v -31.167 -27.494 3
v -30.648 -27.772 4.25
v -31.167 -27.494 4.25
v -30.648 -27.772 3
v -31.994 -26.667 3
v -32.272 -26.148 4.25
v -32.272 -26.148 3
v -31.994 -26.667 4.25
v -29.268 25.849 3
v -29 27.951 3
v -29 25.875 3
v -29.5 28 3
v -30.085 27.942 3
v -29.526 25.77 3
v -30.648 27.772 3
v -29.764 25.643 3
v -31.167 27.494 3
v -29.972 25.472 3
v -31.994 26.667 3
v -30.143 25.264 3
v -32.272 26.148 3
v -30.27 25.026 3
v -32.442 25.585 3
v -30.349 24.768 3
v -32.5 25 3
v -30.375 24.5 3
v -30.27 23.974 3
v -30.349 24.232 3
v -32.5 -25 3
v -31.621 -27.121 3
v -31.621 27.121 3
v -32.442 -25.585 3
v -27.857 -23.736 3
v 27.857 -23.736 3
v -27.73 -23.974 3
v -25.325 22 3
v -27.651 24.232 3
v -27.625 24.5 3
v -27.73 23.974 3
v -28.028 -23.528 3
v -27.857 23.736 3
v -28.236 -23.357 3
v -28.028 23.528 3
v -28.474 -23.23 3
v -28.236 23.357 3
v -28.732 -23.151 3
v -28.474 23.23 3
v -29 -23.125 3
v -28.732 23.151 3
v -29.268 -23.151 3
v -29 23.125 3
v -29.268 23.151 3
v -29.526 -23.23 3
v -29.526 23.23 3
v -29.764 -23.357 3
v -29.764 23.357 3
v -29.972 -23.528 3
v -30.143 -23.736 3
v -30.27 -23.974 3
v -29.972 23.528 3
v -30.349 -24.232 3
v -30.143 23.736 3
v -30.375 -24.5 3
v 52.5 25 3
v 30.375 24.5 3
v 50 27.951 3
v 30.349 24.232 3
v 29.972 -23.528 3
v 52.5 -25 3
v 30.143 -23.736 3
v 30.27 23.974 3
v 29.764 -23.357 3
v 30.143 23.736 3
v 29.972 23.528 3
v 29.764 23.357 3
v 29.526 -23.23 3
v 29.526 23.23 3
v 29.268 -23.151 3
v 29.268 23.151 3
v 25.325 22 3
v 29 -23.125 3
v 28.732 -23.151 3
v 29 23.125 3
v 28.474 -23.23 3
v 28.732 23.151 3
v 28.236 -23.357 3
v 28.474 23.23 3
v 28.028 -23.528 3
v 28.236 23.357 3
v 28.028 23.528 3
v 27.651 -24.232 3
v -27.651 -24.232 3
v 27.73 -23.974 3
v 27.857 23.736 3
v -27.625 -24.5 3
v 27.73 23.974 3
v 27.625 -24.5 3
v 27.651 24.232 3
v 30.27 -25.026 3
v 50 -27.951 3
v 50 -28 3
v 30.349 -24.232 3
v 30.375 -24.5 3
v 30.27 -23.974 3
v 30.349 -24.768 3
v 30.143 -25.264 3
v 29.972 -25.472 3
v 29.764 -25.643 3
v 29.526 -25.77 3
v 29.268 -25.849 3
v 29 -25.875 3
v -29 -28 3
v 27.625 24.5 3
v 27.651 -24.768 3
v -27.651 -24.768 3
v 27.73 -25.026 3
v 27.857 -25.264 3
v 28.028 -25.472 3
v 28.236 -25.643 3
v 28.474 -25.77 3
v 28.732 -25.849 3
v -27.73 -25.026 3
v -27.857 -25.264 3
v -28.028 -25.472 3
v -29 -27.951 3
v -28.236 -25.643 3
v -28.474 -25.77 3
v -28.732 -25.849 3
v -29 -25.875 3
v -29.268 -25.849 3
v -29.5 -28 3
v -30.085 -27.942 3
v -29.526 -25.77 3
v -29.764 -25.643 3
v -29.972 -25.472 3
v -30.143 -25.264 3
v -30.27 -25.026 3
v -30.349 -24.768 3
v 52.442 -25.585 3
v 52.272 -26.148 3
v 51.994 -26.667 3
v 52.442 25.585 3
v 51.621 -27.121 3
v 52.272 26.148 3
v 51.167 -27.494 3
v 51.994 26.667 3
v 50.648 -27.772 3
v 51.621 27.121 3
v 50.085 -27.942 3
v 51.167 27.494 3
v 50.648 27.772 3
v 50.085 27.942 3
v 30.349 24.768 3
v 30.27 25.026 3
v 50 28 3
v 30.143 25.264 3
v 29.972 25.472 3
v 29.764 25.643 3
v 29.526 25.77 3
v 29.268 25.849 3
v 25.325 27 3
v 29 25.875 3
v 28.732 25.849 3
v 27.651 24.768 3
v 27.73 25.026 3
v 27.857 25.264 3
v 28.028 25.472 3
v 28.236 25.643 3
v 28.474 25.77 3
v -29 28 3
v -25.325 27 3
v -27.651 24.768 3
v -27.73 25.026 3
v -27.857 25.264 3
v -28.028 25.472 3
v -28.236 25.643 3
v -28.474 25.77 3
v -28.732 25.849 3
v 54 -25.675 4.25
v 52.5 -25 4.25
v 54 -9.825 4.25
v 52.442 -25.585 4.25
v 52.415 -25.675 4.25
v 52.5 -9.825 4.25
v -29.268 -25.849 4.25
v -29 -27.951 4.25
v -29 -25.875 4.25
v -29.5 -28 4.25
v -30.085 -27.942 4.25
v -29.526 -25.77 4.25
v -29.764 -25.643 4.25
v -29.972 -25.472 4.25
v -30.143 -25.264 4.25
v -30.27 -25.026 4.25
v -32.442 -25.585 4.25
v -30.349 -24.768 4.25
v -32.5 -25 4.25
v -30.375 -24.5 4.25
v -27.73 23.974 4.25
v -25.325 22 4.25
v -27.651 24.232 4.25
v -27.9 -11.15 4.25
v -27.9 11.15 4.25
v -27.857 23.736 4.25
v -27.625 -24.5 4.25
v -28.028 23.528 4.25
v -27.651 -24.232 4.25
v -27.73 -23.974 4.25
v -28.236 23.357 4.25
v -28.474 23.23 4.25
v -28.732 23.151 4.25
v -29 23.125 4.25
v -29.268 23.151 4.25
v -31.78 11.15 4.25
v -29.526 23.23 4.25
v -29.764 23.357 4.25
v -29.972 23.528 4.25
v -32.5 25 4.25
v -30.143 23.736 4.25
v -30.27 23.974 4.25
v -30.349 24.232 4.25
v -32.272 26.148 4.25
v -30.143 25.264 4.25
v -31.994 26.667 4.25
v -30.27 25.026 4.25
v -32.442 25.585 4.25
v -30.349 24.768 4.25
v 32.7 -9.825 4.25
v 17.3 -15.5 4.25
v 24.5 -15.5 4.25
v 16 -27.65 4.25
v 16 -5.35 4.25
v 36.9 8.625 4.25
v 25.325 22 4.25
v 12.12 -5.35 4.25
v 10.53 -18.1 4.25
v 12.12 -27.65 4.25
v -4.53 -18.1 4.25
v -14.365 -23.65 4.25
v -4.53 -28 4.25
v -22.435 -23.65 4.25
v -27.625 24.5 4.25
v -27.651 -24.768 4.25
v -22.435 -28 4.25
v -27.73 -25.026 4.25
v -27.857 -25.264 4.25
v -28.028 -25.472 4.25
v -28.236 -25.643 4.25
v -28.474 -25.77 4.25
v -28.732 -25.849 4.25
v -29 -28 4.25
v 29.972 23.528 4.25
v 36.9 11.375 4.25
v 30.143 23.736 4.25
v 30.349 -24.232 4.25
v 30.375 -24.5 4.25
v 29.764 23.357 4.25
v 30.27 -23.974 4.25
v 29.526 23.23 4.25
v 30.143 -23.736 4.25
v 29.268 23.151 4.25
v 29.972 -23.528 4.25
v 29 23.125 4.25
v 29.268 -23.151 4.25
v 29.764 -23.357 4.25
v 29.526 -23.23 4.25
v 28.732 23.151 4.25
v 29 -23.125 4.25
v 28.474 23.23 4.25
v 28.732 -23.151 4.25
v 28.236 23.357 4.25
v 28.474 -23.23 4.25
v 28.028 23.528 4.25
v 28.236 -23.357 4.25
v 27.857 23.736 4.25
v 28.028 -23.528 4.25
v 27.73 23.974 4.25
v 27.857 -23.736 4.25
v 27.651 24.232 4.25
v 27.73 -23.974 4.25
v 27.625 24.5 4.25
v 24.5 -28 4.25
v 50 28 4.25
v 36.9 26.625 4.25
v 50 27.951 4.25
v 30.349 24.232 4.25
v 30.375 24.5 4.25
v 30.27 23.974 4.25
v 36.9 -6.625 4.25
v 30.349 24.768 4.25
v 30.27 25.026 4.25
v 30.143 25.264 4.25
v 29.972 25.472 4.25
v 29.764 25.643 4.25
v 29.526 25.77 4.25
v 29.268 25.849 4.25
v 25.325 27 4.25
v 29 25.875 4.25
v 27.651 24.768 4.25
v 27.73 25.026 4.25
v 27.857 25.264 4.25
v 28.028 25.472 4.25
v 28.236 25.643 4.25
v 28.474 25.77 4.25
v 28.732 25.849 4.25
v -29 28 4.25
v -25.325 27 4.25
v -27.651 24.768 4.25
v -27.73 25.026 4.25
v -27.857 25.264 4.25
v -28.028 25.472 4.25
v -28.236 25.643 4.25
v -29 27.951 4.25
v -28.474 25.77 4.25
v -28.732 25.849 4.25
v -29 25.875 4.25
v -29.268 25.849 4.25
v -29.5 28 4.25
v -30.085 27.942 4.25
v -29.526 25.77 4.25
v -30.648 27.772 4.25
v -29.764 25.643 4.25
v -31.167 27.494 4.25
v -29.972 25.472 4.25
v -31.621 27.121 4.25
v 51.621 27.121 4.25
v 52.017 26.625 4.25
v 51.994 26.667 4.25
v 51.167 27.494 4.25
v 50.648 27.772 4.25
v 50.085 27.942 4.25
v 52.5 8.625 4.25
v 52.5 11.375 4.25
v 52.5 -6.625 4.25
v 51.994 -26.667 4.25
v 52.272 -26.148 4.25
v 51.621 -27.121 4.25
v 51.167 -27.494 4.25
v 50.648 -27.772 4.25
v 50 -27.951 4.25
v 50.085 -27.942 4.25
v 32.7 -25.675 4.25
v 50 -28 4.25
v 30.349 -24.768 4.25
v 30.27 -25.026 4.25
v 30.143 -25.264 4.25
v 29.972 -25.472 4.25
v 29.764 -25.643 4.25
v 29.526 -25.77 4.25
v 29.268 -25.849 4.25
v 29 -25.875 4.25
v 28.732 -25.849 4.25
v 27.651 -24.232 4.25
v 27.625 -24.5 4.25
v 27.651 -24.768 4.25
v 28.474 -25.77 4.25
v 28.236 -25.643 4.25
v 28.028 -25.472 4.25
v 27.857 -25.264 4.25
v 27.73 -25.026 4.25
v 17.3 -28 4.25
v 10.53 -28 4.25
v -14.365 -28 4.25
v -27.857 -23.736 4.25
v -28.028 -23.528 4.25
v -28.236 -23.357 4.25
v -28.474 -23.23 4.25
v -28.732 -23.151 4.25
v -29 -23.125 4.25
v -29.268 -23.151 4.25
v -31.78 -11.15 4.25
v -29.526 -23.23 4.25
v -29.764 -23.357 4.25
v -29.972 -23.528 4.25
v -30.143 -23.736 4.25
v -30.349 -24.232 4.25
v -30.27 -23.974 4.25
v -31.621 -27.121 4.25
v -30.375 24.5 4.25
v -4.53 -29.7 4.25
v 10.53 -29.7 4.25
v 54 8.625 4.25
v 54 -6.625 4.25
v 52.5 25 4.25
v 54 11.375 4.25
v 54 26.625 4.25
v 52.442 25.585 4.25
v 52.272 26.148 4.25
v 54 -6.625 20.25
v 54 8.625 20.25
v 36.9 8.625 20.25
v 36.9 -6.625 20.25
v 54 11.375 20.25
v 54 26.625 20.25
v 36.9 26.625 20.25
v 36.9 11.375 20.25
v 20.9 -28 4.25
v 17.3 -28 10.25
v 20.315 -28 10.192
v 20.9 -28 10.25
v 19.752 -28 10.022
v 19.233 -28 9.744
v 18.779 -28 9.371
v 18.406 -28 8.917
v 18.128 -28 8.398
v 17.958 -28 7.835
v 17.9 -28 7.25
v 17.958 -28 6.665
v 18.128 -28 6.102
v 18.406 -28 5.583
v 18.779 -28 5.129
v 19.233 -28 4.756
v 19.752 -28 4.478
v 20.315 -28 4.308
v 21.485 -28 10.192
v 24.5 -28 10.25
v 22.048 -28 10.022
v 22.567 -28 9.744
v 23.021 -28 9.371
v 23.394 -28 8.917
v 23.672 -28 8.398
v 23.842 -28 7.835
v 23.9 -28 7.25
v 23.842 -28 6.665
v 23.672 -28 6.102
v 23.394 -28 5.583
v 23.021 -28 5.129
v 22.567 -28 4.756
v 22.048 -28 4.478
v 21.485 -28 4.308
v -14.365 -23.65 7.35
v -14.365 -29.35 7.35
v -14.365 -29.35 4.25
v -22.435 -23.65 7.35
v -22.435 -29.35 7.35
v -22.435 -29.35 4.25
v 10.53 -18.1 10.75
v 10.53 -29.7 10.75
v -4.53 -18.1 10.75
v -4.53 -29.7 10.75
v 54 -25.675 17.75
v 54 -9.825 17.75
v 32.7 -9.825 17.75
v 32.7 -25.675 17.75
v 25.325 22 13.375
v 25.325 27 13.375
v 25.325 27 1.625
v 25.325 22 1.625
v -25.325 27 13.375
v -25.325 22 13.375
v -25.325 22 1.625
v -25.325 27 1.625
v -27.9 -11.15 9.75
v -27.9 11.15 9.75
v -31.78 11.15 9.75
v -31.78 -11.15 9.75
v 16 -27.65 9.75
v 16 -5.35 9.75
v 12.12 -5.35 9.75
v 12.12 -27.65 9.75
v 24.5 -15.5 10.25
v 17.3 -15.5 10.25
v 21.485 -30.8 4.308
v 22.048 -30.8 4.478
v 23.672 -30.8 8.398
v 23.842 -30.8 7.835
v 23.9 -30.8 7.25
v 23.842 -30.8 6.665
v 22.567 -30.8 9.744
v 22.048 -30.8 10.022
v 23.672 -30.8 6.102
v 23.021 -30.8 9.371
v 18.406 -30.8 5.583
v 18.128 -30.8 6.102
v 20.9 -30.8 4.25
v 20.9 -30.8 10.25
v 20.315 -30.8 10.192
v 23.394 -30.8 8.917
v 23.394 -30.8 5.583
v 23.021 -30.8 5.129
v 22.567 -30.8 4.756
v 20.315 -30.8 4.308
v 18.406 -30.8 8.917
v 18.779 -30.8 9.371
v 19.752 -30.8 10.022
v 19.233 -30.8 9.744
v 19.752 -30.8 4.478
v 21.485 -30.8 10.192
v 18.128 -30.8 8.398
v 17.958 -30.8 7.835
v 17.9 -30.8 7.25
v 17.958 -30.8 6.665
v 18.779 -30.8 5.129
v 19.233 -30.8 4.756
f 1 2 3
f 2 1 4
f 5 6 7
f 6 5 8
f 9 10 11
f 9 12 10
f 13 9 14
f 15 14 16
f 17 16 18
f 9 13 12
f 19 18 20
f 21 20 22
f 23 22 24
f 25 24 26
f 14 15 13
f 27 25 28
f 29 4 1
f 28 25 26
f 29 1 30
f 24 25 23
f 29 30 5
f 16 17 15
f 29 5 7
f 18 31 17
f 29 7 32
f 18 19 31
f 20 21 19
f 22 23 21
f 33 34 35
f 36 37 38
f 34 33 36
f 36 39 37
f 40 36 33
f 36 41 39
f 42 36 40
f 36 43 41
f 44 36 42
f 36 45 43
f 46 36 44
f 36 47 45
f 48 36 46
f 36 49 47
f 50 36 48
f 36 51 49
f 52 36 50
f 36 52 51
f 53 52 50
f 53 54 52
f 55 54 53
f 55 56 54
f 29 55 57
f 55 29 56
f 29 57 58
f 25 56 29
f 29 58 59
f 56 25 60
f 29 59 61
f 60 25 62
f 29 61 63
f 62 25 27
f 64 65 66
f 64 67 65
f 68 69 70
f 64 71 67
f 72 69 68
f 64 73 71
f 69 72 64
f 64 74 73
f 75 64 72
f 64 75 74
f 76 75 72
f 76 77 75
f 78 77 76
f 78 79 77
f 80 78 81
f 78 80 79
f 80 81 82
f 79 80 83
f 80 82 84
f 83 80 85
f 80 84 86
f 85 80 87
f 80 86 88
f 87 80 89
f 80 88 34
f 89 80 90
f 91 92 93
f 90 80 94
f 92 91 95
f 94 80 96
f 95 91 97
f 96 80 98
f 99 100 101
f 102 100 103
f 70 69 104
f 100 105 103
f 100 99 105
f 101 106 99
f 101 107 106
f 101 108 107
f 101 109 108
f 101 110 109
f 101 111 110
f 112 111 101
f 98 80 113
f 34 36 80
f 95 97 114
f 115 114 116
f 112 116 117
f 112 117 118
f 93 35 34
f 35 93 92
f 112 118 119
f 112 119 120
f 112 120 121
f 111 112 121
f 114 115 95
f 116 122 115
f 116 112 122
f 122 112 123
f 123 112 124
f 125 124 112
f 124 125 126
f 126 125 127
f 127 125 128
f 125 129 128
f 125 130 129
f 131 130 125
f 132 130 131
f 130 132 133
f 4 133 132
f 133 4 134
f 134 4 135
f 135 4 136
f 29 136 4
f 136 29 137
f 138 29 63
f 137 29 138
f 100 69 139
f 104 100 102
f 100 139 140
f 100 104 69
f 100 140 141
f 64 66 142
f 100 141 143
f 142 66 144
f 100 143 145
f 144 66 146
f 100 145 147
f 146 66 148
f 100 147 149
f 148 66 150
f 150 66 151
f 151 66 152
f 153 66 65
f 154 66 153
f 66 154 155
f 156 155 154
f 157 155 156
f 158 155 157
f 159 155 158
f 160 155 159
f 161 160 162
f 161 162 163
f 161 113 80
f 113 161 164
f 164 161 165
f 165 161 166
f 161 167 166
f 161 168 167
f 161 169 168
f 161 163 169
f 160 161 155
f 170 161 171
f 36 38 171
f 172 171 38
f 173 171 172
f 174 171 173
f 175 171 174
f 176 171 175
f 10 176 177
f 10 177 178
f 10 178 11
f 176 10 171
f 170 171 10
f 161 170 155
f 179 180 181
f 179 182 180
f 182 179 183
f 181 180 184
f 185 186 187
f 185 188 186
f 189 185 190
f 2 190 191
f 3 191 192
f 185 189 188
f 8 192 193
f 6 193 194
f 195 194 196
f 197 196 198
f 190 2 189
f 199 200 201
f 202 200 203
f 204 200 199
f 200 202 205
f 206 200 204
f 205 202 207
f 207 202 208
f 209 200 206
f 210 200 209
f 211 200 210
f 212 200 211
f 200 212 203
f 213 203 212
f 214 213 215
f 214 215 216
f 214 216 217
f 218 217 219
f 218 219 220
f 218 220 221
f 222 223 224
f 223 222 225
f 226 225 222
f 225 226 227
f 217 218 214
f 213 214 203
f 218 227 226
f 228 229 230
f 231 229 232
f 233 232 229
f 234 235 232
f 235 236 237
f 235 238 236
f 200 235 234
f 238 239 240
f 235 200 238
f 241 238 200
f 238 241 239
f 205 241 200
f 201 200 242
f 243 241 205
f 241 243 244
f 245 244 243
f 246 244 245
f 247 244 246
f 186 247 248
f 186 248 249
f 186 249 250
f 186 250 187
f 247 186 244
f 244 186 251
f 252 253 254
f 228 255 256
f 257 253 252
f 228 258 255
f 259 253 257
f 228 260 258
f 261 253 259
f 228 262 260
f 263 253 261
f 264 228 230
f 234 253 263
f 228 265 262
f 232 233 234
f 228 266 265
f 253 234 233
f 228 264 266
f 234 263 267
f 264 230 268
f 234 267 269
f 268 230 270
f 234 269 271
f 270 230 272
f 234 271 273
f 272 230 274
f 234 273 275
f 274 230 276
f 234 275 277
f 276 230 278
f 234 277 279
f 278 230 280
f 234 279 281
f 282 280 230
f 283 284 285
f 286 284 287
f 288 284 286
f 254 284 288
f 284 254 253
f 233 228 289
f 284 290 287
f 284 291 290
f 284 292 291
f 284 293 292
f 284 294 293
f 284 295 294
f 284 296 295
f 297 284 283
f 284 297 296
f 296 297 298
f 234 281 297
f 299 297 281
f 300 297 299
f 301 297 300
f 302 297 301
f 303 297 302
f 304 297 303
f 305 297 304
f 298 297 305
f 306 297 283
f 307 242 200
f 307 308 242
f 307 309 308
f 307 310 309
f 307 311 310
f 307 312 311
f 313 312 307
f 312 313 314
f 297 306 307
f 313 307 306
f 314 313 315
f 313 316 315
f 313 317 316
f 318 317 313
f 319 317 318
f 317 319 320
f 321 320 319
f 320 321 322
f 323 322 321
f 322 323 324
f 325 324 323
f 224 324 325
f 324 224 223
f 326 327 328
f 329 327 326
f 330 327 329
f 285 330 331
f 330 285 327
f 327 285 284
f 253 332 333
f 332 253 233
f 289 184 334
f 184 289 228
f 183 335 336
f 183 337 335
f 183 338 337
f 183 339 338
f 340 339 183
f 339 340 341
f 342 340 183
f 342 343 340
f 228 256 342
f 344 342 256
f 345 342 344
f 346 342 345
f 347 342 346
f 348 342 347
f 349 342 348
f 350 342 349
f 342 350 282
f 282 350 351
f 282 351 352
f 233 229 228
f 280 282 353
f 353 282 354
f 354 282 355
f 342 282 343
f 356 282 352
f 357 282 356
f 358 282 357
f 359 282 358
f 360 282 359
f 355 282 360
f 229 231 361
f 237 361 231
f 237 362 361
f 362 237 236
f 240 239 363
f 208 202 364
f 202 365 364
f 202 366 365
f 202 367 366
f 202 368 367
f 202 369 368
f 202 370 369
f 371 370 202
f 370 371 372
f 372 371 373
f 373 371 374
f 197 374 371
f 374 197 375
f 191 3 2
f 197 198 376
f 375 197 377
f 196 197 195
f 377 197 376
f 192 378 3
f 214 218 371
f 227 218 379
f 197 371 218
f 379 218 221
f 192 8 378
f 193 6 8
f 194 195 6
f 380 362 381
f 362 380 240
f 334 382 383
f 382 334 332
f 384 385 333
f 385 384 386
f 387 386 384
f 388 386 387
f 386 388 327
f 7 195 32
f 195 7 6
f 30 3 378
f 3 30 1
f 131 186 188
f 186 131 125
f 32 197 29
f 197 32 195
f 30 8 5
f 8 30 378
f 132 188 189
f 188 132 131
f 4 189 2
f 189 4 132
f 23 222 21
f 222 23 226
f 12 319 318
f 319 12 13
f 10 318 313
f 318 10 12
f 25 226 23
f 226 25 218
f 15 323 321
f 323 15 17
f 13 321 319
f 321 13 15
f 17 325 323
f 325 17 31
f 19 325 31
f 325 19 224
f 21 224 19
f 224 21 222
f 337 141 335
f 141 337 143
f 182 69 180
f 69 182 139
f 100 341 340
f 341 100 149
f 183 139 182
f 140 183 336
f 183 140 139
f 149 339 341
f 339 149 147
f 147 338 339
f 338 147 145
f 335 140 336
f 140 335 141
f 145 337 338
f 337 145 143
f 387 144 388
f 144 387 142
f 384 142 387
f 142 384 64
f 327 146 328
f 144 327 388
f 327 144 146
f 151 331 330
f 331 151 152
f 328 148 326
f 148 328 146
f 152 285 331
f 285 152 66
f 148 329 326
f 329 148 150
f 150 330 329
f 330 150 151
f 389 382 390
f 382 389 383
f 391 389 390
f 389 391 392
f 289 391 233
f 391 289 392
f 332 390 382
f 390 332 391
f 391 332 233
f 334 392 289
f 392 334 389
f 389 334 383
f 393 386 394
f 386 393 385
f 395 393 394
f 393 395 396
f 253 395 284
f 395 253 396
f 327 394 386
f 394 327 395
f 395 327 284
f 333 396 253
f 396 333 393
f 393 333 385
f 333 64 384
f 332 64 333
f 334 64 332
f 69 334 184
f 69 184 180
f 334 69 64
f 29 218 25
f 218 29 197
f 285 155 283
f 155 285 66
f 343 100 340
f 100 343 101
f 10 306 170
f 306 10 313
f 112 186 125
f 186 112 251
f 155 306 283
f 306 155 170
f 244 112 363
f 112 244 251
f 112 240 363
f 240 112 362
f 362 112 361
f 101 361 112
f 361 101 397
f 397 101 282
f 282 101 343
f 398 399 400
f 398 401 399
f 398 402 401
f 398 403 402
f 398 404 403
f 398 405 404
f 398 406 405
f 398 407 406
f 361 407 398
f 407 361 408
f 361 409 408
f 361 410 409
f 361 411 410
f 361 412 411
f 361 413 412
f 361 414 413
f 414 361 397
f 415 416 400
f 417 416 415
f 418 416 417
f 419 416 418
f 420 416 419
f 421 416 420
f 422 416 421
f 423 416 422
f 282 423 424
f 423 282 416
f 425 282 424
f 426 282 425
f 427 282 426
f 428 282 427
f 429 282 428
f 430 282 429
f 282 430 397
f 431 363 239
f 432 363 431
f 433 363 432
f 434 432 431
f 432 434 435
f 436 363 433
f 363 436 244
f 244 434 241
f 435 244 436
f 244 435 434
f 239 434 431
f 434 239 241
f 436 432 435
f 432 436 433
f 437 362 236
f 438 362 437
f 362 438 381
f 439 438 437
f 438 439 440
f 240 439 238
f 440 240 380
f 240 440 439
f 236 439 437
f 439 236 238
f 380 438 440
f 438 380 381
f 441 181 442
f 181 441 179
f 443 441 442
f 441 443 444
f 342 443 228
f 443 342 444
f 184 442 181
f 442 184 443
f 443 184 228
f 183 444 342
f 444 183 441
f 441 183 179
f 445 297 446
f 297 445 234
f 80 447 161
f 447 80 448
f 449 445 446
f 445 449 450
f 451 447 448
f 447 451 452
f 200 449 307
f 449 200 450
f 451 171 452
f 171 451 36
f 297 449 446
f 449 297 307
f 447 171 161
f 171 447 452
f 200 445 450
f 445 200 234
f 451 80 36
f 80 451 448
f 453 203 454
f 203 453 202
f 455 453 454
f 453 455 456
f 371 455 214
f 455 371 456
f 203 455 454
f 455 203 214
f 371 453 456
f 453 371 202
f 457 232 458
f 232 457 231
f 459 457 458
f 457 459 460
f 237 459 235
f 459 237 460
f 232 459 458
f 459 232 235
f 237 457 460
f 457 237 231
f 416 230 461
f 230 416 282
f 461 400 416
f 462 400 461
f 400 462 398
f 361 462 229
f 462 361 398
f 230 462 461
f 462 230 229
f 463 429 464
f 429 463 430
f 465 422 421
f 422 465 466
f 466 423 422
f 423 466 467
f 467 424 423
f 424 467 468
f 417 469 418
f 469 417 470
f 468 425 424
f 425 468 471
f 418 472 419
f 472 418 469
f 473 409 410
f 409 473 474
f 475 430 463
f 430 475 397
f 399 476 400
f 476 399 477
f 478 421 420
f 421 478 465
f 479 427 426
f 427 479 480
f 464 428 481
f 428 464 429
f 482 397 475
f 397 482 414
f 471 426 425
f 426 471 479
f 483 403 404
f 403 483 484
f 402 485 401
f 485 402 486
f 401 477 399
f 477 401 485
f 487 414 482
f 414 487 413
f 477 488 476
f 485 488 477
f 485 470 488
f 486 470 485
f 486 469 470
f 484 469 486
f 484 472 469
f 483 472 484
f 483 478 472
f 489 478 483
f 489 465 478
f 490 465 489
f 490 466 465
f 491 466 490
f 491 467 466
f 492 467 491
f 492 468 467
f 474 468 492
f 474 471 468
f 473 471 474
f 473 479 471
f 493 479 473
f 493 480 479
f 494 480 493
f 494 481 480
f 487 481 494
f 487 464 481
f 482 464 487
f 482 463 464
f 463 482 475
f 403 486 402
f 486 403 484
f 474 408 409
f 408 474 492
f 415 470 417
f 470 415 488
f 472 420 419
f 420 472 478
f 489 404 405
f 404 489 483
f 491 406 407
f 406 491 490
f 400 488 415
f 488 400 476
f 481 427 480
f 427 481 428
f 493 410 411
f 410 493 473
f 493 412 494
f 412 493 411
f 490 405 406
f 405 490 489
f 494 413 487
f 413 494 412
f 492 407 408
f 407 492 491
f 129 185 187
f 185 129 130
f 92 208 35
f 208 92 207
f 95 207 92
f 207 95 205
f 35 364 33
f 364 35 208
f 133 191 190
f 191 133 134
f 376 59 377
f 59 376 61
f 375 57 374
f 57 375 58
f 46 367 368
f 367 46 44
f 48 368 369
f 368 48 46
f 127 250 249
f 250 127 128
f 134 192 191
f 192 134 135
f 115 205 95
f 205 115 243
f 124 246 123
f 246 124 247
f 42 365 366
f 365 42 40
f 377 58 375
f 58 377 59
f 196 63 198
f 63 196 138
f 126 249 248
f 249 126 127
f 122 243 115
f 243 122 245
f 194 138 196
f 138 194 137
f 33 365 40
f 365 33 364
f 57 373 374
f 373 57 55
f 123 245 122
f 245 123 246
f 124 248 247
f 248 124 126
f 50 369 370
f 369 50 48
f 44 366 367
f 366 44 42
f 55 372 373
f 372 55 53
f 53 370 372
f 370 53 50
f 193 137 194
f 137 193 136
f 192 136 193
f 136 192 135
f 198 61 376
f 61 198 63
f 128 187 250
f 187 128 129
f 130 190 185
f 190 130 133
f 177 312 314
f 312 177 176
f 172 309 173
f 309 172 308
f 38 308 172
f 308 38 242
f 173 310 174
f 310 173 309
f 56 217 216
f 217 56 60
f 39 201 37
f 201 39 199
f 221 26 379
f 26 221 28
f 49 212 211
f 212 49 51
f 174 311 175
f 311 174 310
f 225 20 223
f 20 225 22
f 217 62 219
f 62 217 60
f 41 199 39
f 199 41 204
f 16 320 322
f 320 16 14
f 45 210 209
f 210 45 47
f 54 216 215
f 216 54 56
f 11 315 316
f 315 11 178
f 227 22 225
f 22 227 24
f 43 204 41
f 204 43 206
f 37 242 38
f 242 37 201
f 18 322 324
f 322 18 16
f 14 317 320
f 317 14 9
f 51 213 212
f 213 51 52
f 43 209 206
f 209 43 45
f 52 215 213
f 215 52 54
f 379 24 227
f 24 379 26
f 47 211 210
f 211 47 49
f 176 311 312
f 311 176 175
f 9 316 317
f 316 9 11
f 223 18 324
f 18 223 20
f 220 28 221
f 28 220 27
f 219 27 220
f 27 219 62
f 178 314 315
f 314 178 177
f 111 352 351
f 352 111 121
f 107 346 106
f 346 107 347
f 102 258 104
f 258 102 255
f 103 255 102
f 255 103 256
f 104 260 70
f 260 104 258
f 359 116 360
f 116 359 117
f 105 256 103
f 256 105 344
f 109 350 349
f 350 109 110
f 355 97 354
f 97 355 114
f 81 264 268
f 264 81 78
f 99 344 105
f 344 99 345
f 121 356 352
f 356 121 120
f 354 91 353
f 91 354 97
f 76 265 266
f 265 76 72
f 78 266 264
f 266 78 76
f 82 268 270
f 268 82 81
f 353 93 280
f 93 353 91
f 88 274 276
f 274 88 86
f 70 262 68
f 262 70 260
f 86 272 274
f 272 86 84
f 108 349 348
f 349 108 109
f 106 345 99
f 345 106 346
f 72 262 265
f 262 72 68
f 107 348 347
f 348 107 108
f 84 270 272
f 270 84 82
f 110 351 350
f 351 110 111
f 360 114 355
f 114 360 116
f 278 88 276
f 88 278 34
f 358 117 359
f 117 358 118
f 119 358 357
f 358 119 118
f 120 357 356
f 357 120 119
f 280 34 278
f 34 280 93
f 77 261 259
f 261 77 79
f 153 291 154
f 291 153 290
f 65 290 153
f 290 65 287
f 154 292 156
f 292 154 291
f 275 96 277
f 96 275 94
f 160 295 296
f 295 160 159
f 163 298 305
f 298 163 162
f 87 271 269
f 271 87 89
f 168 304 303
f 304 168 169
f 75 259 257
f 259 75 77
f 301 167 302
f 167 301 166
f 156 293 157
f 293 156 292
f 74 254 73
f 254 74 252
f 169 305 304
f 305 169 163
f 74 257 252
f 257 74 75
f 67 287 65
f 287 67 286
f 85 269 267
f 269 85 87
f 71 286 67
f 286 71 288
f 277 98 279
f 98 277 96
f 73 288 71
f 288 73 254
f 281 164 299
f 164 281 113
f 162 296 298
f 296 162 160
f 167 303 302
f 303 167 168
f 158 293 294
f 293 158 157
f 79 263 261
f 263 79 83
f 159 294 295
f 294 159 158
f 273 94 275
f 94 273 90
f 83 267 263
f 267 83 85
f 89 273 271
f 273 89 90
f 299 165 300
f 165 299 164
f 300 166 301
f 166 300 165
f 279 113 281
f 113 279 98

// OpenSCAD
module raspi3() {
    ph = 1.25;
    mxh = 2;
    hdx = 58;
    hdy = 49;
    cr = 3;
    be = -58/2;
    difference() {
        union() {
            for(x=[-1, 1]) {
                for(y=[-1, 1]) {
                    translate([x*(85/2-cr)+27/2-3.5, y*(56/2-cr), 0]) cylinder(r=cr, h=ph, $fn=32);
                }
            }
            translate([be-3.5, -56/2+cr, 0]) cube([85, 56-2*cr, ph]);
            translate([be, -56/2, 0]) cube([85-2*cr, 56, ph]);
            // micro USB power
            translate([be+10.6, -56/2-(57.35-56)+5.7/2, ph+3.1/2]) cube([8.07, 5.7, 3.1], center=true);
            // HDMI socket
            translate([be+32, -56/2-(57.7-56)+11.6/2, ph+6.5/2]) cube([15.06, 11.6, 6.5], center=true);
            // ethernet
            translate([be+85-2-21.3/2, -56/2+10.25, ph+13.5/2]) cube([21.3, 15.85, 13.5], center=true);
            // usb
            for(i=[29, 47]) {
                translate([be+85-2-17.1/2, -56/2+i, ph+16/2]) cube([17.1, 15.25, 16], center=true);
            }
            // pin header
            translate([be+29, 49/2, ph+8.5/2-mxh/2]) cube([50.65, 5, 8.5+ph+mxh], center=true);
            // display connector
            translate([be+1.1-3.88/2, 0, ph+5.5/2]) cube([3.88, 22.3, 5.5], center=true);
            // camera connector
            translate([be+32+13-3.88/2, -56/2+11.5, ph+5.5/2]) cube([3.88, 22.3, 5.5], center=true);
            // headphone jack
            translate([be+53.5-7.2/2, -56/2+12.5/2, ph+6/2]) cube([7.2, 12.5, 6], center=true);
            translate([be+53.5-7.2/2, -56/2, ph+6/2]) rotate([90, 0, 0]) cylinder(d=6, h=2.8, $fn=32);
        }
        for(x=[-hdx/2, hdx/2]) {
            for(y=[-hdy/2, hdy/2]) {
                translate([x, y, -1]) cylinder(d=2.75, h=ph+2, $fn=32);
            }
        }
    }
}
translate([0, 0, 3]) color("blue") raspi3();
